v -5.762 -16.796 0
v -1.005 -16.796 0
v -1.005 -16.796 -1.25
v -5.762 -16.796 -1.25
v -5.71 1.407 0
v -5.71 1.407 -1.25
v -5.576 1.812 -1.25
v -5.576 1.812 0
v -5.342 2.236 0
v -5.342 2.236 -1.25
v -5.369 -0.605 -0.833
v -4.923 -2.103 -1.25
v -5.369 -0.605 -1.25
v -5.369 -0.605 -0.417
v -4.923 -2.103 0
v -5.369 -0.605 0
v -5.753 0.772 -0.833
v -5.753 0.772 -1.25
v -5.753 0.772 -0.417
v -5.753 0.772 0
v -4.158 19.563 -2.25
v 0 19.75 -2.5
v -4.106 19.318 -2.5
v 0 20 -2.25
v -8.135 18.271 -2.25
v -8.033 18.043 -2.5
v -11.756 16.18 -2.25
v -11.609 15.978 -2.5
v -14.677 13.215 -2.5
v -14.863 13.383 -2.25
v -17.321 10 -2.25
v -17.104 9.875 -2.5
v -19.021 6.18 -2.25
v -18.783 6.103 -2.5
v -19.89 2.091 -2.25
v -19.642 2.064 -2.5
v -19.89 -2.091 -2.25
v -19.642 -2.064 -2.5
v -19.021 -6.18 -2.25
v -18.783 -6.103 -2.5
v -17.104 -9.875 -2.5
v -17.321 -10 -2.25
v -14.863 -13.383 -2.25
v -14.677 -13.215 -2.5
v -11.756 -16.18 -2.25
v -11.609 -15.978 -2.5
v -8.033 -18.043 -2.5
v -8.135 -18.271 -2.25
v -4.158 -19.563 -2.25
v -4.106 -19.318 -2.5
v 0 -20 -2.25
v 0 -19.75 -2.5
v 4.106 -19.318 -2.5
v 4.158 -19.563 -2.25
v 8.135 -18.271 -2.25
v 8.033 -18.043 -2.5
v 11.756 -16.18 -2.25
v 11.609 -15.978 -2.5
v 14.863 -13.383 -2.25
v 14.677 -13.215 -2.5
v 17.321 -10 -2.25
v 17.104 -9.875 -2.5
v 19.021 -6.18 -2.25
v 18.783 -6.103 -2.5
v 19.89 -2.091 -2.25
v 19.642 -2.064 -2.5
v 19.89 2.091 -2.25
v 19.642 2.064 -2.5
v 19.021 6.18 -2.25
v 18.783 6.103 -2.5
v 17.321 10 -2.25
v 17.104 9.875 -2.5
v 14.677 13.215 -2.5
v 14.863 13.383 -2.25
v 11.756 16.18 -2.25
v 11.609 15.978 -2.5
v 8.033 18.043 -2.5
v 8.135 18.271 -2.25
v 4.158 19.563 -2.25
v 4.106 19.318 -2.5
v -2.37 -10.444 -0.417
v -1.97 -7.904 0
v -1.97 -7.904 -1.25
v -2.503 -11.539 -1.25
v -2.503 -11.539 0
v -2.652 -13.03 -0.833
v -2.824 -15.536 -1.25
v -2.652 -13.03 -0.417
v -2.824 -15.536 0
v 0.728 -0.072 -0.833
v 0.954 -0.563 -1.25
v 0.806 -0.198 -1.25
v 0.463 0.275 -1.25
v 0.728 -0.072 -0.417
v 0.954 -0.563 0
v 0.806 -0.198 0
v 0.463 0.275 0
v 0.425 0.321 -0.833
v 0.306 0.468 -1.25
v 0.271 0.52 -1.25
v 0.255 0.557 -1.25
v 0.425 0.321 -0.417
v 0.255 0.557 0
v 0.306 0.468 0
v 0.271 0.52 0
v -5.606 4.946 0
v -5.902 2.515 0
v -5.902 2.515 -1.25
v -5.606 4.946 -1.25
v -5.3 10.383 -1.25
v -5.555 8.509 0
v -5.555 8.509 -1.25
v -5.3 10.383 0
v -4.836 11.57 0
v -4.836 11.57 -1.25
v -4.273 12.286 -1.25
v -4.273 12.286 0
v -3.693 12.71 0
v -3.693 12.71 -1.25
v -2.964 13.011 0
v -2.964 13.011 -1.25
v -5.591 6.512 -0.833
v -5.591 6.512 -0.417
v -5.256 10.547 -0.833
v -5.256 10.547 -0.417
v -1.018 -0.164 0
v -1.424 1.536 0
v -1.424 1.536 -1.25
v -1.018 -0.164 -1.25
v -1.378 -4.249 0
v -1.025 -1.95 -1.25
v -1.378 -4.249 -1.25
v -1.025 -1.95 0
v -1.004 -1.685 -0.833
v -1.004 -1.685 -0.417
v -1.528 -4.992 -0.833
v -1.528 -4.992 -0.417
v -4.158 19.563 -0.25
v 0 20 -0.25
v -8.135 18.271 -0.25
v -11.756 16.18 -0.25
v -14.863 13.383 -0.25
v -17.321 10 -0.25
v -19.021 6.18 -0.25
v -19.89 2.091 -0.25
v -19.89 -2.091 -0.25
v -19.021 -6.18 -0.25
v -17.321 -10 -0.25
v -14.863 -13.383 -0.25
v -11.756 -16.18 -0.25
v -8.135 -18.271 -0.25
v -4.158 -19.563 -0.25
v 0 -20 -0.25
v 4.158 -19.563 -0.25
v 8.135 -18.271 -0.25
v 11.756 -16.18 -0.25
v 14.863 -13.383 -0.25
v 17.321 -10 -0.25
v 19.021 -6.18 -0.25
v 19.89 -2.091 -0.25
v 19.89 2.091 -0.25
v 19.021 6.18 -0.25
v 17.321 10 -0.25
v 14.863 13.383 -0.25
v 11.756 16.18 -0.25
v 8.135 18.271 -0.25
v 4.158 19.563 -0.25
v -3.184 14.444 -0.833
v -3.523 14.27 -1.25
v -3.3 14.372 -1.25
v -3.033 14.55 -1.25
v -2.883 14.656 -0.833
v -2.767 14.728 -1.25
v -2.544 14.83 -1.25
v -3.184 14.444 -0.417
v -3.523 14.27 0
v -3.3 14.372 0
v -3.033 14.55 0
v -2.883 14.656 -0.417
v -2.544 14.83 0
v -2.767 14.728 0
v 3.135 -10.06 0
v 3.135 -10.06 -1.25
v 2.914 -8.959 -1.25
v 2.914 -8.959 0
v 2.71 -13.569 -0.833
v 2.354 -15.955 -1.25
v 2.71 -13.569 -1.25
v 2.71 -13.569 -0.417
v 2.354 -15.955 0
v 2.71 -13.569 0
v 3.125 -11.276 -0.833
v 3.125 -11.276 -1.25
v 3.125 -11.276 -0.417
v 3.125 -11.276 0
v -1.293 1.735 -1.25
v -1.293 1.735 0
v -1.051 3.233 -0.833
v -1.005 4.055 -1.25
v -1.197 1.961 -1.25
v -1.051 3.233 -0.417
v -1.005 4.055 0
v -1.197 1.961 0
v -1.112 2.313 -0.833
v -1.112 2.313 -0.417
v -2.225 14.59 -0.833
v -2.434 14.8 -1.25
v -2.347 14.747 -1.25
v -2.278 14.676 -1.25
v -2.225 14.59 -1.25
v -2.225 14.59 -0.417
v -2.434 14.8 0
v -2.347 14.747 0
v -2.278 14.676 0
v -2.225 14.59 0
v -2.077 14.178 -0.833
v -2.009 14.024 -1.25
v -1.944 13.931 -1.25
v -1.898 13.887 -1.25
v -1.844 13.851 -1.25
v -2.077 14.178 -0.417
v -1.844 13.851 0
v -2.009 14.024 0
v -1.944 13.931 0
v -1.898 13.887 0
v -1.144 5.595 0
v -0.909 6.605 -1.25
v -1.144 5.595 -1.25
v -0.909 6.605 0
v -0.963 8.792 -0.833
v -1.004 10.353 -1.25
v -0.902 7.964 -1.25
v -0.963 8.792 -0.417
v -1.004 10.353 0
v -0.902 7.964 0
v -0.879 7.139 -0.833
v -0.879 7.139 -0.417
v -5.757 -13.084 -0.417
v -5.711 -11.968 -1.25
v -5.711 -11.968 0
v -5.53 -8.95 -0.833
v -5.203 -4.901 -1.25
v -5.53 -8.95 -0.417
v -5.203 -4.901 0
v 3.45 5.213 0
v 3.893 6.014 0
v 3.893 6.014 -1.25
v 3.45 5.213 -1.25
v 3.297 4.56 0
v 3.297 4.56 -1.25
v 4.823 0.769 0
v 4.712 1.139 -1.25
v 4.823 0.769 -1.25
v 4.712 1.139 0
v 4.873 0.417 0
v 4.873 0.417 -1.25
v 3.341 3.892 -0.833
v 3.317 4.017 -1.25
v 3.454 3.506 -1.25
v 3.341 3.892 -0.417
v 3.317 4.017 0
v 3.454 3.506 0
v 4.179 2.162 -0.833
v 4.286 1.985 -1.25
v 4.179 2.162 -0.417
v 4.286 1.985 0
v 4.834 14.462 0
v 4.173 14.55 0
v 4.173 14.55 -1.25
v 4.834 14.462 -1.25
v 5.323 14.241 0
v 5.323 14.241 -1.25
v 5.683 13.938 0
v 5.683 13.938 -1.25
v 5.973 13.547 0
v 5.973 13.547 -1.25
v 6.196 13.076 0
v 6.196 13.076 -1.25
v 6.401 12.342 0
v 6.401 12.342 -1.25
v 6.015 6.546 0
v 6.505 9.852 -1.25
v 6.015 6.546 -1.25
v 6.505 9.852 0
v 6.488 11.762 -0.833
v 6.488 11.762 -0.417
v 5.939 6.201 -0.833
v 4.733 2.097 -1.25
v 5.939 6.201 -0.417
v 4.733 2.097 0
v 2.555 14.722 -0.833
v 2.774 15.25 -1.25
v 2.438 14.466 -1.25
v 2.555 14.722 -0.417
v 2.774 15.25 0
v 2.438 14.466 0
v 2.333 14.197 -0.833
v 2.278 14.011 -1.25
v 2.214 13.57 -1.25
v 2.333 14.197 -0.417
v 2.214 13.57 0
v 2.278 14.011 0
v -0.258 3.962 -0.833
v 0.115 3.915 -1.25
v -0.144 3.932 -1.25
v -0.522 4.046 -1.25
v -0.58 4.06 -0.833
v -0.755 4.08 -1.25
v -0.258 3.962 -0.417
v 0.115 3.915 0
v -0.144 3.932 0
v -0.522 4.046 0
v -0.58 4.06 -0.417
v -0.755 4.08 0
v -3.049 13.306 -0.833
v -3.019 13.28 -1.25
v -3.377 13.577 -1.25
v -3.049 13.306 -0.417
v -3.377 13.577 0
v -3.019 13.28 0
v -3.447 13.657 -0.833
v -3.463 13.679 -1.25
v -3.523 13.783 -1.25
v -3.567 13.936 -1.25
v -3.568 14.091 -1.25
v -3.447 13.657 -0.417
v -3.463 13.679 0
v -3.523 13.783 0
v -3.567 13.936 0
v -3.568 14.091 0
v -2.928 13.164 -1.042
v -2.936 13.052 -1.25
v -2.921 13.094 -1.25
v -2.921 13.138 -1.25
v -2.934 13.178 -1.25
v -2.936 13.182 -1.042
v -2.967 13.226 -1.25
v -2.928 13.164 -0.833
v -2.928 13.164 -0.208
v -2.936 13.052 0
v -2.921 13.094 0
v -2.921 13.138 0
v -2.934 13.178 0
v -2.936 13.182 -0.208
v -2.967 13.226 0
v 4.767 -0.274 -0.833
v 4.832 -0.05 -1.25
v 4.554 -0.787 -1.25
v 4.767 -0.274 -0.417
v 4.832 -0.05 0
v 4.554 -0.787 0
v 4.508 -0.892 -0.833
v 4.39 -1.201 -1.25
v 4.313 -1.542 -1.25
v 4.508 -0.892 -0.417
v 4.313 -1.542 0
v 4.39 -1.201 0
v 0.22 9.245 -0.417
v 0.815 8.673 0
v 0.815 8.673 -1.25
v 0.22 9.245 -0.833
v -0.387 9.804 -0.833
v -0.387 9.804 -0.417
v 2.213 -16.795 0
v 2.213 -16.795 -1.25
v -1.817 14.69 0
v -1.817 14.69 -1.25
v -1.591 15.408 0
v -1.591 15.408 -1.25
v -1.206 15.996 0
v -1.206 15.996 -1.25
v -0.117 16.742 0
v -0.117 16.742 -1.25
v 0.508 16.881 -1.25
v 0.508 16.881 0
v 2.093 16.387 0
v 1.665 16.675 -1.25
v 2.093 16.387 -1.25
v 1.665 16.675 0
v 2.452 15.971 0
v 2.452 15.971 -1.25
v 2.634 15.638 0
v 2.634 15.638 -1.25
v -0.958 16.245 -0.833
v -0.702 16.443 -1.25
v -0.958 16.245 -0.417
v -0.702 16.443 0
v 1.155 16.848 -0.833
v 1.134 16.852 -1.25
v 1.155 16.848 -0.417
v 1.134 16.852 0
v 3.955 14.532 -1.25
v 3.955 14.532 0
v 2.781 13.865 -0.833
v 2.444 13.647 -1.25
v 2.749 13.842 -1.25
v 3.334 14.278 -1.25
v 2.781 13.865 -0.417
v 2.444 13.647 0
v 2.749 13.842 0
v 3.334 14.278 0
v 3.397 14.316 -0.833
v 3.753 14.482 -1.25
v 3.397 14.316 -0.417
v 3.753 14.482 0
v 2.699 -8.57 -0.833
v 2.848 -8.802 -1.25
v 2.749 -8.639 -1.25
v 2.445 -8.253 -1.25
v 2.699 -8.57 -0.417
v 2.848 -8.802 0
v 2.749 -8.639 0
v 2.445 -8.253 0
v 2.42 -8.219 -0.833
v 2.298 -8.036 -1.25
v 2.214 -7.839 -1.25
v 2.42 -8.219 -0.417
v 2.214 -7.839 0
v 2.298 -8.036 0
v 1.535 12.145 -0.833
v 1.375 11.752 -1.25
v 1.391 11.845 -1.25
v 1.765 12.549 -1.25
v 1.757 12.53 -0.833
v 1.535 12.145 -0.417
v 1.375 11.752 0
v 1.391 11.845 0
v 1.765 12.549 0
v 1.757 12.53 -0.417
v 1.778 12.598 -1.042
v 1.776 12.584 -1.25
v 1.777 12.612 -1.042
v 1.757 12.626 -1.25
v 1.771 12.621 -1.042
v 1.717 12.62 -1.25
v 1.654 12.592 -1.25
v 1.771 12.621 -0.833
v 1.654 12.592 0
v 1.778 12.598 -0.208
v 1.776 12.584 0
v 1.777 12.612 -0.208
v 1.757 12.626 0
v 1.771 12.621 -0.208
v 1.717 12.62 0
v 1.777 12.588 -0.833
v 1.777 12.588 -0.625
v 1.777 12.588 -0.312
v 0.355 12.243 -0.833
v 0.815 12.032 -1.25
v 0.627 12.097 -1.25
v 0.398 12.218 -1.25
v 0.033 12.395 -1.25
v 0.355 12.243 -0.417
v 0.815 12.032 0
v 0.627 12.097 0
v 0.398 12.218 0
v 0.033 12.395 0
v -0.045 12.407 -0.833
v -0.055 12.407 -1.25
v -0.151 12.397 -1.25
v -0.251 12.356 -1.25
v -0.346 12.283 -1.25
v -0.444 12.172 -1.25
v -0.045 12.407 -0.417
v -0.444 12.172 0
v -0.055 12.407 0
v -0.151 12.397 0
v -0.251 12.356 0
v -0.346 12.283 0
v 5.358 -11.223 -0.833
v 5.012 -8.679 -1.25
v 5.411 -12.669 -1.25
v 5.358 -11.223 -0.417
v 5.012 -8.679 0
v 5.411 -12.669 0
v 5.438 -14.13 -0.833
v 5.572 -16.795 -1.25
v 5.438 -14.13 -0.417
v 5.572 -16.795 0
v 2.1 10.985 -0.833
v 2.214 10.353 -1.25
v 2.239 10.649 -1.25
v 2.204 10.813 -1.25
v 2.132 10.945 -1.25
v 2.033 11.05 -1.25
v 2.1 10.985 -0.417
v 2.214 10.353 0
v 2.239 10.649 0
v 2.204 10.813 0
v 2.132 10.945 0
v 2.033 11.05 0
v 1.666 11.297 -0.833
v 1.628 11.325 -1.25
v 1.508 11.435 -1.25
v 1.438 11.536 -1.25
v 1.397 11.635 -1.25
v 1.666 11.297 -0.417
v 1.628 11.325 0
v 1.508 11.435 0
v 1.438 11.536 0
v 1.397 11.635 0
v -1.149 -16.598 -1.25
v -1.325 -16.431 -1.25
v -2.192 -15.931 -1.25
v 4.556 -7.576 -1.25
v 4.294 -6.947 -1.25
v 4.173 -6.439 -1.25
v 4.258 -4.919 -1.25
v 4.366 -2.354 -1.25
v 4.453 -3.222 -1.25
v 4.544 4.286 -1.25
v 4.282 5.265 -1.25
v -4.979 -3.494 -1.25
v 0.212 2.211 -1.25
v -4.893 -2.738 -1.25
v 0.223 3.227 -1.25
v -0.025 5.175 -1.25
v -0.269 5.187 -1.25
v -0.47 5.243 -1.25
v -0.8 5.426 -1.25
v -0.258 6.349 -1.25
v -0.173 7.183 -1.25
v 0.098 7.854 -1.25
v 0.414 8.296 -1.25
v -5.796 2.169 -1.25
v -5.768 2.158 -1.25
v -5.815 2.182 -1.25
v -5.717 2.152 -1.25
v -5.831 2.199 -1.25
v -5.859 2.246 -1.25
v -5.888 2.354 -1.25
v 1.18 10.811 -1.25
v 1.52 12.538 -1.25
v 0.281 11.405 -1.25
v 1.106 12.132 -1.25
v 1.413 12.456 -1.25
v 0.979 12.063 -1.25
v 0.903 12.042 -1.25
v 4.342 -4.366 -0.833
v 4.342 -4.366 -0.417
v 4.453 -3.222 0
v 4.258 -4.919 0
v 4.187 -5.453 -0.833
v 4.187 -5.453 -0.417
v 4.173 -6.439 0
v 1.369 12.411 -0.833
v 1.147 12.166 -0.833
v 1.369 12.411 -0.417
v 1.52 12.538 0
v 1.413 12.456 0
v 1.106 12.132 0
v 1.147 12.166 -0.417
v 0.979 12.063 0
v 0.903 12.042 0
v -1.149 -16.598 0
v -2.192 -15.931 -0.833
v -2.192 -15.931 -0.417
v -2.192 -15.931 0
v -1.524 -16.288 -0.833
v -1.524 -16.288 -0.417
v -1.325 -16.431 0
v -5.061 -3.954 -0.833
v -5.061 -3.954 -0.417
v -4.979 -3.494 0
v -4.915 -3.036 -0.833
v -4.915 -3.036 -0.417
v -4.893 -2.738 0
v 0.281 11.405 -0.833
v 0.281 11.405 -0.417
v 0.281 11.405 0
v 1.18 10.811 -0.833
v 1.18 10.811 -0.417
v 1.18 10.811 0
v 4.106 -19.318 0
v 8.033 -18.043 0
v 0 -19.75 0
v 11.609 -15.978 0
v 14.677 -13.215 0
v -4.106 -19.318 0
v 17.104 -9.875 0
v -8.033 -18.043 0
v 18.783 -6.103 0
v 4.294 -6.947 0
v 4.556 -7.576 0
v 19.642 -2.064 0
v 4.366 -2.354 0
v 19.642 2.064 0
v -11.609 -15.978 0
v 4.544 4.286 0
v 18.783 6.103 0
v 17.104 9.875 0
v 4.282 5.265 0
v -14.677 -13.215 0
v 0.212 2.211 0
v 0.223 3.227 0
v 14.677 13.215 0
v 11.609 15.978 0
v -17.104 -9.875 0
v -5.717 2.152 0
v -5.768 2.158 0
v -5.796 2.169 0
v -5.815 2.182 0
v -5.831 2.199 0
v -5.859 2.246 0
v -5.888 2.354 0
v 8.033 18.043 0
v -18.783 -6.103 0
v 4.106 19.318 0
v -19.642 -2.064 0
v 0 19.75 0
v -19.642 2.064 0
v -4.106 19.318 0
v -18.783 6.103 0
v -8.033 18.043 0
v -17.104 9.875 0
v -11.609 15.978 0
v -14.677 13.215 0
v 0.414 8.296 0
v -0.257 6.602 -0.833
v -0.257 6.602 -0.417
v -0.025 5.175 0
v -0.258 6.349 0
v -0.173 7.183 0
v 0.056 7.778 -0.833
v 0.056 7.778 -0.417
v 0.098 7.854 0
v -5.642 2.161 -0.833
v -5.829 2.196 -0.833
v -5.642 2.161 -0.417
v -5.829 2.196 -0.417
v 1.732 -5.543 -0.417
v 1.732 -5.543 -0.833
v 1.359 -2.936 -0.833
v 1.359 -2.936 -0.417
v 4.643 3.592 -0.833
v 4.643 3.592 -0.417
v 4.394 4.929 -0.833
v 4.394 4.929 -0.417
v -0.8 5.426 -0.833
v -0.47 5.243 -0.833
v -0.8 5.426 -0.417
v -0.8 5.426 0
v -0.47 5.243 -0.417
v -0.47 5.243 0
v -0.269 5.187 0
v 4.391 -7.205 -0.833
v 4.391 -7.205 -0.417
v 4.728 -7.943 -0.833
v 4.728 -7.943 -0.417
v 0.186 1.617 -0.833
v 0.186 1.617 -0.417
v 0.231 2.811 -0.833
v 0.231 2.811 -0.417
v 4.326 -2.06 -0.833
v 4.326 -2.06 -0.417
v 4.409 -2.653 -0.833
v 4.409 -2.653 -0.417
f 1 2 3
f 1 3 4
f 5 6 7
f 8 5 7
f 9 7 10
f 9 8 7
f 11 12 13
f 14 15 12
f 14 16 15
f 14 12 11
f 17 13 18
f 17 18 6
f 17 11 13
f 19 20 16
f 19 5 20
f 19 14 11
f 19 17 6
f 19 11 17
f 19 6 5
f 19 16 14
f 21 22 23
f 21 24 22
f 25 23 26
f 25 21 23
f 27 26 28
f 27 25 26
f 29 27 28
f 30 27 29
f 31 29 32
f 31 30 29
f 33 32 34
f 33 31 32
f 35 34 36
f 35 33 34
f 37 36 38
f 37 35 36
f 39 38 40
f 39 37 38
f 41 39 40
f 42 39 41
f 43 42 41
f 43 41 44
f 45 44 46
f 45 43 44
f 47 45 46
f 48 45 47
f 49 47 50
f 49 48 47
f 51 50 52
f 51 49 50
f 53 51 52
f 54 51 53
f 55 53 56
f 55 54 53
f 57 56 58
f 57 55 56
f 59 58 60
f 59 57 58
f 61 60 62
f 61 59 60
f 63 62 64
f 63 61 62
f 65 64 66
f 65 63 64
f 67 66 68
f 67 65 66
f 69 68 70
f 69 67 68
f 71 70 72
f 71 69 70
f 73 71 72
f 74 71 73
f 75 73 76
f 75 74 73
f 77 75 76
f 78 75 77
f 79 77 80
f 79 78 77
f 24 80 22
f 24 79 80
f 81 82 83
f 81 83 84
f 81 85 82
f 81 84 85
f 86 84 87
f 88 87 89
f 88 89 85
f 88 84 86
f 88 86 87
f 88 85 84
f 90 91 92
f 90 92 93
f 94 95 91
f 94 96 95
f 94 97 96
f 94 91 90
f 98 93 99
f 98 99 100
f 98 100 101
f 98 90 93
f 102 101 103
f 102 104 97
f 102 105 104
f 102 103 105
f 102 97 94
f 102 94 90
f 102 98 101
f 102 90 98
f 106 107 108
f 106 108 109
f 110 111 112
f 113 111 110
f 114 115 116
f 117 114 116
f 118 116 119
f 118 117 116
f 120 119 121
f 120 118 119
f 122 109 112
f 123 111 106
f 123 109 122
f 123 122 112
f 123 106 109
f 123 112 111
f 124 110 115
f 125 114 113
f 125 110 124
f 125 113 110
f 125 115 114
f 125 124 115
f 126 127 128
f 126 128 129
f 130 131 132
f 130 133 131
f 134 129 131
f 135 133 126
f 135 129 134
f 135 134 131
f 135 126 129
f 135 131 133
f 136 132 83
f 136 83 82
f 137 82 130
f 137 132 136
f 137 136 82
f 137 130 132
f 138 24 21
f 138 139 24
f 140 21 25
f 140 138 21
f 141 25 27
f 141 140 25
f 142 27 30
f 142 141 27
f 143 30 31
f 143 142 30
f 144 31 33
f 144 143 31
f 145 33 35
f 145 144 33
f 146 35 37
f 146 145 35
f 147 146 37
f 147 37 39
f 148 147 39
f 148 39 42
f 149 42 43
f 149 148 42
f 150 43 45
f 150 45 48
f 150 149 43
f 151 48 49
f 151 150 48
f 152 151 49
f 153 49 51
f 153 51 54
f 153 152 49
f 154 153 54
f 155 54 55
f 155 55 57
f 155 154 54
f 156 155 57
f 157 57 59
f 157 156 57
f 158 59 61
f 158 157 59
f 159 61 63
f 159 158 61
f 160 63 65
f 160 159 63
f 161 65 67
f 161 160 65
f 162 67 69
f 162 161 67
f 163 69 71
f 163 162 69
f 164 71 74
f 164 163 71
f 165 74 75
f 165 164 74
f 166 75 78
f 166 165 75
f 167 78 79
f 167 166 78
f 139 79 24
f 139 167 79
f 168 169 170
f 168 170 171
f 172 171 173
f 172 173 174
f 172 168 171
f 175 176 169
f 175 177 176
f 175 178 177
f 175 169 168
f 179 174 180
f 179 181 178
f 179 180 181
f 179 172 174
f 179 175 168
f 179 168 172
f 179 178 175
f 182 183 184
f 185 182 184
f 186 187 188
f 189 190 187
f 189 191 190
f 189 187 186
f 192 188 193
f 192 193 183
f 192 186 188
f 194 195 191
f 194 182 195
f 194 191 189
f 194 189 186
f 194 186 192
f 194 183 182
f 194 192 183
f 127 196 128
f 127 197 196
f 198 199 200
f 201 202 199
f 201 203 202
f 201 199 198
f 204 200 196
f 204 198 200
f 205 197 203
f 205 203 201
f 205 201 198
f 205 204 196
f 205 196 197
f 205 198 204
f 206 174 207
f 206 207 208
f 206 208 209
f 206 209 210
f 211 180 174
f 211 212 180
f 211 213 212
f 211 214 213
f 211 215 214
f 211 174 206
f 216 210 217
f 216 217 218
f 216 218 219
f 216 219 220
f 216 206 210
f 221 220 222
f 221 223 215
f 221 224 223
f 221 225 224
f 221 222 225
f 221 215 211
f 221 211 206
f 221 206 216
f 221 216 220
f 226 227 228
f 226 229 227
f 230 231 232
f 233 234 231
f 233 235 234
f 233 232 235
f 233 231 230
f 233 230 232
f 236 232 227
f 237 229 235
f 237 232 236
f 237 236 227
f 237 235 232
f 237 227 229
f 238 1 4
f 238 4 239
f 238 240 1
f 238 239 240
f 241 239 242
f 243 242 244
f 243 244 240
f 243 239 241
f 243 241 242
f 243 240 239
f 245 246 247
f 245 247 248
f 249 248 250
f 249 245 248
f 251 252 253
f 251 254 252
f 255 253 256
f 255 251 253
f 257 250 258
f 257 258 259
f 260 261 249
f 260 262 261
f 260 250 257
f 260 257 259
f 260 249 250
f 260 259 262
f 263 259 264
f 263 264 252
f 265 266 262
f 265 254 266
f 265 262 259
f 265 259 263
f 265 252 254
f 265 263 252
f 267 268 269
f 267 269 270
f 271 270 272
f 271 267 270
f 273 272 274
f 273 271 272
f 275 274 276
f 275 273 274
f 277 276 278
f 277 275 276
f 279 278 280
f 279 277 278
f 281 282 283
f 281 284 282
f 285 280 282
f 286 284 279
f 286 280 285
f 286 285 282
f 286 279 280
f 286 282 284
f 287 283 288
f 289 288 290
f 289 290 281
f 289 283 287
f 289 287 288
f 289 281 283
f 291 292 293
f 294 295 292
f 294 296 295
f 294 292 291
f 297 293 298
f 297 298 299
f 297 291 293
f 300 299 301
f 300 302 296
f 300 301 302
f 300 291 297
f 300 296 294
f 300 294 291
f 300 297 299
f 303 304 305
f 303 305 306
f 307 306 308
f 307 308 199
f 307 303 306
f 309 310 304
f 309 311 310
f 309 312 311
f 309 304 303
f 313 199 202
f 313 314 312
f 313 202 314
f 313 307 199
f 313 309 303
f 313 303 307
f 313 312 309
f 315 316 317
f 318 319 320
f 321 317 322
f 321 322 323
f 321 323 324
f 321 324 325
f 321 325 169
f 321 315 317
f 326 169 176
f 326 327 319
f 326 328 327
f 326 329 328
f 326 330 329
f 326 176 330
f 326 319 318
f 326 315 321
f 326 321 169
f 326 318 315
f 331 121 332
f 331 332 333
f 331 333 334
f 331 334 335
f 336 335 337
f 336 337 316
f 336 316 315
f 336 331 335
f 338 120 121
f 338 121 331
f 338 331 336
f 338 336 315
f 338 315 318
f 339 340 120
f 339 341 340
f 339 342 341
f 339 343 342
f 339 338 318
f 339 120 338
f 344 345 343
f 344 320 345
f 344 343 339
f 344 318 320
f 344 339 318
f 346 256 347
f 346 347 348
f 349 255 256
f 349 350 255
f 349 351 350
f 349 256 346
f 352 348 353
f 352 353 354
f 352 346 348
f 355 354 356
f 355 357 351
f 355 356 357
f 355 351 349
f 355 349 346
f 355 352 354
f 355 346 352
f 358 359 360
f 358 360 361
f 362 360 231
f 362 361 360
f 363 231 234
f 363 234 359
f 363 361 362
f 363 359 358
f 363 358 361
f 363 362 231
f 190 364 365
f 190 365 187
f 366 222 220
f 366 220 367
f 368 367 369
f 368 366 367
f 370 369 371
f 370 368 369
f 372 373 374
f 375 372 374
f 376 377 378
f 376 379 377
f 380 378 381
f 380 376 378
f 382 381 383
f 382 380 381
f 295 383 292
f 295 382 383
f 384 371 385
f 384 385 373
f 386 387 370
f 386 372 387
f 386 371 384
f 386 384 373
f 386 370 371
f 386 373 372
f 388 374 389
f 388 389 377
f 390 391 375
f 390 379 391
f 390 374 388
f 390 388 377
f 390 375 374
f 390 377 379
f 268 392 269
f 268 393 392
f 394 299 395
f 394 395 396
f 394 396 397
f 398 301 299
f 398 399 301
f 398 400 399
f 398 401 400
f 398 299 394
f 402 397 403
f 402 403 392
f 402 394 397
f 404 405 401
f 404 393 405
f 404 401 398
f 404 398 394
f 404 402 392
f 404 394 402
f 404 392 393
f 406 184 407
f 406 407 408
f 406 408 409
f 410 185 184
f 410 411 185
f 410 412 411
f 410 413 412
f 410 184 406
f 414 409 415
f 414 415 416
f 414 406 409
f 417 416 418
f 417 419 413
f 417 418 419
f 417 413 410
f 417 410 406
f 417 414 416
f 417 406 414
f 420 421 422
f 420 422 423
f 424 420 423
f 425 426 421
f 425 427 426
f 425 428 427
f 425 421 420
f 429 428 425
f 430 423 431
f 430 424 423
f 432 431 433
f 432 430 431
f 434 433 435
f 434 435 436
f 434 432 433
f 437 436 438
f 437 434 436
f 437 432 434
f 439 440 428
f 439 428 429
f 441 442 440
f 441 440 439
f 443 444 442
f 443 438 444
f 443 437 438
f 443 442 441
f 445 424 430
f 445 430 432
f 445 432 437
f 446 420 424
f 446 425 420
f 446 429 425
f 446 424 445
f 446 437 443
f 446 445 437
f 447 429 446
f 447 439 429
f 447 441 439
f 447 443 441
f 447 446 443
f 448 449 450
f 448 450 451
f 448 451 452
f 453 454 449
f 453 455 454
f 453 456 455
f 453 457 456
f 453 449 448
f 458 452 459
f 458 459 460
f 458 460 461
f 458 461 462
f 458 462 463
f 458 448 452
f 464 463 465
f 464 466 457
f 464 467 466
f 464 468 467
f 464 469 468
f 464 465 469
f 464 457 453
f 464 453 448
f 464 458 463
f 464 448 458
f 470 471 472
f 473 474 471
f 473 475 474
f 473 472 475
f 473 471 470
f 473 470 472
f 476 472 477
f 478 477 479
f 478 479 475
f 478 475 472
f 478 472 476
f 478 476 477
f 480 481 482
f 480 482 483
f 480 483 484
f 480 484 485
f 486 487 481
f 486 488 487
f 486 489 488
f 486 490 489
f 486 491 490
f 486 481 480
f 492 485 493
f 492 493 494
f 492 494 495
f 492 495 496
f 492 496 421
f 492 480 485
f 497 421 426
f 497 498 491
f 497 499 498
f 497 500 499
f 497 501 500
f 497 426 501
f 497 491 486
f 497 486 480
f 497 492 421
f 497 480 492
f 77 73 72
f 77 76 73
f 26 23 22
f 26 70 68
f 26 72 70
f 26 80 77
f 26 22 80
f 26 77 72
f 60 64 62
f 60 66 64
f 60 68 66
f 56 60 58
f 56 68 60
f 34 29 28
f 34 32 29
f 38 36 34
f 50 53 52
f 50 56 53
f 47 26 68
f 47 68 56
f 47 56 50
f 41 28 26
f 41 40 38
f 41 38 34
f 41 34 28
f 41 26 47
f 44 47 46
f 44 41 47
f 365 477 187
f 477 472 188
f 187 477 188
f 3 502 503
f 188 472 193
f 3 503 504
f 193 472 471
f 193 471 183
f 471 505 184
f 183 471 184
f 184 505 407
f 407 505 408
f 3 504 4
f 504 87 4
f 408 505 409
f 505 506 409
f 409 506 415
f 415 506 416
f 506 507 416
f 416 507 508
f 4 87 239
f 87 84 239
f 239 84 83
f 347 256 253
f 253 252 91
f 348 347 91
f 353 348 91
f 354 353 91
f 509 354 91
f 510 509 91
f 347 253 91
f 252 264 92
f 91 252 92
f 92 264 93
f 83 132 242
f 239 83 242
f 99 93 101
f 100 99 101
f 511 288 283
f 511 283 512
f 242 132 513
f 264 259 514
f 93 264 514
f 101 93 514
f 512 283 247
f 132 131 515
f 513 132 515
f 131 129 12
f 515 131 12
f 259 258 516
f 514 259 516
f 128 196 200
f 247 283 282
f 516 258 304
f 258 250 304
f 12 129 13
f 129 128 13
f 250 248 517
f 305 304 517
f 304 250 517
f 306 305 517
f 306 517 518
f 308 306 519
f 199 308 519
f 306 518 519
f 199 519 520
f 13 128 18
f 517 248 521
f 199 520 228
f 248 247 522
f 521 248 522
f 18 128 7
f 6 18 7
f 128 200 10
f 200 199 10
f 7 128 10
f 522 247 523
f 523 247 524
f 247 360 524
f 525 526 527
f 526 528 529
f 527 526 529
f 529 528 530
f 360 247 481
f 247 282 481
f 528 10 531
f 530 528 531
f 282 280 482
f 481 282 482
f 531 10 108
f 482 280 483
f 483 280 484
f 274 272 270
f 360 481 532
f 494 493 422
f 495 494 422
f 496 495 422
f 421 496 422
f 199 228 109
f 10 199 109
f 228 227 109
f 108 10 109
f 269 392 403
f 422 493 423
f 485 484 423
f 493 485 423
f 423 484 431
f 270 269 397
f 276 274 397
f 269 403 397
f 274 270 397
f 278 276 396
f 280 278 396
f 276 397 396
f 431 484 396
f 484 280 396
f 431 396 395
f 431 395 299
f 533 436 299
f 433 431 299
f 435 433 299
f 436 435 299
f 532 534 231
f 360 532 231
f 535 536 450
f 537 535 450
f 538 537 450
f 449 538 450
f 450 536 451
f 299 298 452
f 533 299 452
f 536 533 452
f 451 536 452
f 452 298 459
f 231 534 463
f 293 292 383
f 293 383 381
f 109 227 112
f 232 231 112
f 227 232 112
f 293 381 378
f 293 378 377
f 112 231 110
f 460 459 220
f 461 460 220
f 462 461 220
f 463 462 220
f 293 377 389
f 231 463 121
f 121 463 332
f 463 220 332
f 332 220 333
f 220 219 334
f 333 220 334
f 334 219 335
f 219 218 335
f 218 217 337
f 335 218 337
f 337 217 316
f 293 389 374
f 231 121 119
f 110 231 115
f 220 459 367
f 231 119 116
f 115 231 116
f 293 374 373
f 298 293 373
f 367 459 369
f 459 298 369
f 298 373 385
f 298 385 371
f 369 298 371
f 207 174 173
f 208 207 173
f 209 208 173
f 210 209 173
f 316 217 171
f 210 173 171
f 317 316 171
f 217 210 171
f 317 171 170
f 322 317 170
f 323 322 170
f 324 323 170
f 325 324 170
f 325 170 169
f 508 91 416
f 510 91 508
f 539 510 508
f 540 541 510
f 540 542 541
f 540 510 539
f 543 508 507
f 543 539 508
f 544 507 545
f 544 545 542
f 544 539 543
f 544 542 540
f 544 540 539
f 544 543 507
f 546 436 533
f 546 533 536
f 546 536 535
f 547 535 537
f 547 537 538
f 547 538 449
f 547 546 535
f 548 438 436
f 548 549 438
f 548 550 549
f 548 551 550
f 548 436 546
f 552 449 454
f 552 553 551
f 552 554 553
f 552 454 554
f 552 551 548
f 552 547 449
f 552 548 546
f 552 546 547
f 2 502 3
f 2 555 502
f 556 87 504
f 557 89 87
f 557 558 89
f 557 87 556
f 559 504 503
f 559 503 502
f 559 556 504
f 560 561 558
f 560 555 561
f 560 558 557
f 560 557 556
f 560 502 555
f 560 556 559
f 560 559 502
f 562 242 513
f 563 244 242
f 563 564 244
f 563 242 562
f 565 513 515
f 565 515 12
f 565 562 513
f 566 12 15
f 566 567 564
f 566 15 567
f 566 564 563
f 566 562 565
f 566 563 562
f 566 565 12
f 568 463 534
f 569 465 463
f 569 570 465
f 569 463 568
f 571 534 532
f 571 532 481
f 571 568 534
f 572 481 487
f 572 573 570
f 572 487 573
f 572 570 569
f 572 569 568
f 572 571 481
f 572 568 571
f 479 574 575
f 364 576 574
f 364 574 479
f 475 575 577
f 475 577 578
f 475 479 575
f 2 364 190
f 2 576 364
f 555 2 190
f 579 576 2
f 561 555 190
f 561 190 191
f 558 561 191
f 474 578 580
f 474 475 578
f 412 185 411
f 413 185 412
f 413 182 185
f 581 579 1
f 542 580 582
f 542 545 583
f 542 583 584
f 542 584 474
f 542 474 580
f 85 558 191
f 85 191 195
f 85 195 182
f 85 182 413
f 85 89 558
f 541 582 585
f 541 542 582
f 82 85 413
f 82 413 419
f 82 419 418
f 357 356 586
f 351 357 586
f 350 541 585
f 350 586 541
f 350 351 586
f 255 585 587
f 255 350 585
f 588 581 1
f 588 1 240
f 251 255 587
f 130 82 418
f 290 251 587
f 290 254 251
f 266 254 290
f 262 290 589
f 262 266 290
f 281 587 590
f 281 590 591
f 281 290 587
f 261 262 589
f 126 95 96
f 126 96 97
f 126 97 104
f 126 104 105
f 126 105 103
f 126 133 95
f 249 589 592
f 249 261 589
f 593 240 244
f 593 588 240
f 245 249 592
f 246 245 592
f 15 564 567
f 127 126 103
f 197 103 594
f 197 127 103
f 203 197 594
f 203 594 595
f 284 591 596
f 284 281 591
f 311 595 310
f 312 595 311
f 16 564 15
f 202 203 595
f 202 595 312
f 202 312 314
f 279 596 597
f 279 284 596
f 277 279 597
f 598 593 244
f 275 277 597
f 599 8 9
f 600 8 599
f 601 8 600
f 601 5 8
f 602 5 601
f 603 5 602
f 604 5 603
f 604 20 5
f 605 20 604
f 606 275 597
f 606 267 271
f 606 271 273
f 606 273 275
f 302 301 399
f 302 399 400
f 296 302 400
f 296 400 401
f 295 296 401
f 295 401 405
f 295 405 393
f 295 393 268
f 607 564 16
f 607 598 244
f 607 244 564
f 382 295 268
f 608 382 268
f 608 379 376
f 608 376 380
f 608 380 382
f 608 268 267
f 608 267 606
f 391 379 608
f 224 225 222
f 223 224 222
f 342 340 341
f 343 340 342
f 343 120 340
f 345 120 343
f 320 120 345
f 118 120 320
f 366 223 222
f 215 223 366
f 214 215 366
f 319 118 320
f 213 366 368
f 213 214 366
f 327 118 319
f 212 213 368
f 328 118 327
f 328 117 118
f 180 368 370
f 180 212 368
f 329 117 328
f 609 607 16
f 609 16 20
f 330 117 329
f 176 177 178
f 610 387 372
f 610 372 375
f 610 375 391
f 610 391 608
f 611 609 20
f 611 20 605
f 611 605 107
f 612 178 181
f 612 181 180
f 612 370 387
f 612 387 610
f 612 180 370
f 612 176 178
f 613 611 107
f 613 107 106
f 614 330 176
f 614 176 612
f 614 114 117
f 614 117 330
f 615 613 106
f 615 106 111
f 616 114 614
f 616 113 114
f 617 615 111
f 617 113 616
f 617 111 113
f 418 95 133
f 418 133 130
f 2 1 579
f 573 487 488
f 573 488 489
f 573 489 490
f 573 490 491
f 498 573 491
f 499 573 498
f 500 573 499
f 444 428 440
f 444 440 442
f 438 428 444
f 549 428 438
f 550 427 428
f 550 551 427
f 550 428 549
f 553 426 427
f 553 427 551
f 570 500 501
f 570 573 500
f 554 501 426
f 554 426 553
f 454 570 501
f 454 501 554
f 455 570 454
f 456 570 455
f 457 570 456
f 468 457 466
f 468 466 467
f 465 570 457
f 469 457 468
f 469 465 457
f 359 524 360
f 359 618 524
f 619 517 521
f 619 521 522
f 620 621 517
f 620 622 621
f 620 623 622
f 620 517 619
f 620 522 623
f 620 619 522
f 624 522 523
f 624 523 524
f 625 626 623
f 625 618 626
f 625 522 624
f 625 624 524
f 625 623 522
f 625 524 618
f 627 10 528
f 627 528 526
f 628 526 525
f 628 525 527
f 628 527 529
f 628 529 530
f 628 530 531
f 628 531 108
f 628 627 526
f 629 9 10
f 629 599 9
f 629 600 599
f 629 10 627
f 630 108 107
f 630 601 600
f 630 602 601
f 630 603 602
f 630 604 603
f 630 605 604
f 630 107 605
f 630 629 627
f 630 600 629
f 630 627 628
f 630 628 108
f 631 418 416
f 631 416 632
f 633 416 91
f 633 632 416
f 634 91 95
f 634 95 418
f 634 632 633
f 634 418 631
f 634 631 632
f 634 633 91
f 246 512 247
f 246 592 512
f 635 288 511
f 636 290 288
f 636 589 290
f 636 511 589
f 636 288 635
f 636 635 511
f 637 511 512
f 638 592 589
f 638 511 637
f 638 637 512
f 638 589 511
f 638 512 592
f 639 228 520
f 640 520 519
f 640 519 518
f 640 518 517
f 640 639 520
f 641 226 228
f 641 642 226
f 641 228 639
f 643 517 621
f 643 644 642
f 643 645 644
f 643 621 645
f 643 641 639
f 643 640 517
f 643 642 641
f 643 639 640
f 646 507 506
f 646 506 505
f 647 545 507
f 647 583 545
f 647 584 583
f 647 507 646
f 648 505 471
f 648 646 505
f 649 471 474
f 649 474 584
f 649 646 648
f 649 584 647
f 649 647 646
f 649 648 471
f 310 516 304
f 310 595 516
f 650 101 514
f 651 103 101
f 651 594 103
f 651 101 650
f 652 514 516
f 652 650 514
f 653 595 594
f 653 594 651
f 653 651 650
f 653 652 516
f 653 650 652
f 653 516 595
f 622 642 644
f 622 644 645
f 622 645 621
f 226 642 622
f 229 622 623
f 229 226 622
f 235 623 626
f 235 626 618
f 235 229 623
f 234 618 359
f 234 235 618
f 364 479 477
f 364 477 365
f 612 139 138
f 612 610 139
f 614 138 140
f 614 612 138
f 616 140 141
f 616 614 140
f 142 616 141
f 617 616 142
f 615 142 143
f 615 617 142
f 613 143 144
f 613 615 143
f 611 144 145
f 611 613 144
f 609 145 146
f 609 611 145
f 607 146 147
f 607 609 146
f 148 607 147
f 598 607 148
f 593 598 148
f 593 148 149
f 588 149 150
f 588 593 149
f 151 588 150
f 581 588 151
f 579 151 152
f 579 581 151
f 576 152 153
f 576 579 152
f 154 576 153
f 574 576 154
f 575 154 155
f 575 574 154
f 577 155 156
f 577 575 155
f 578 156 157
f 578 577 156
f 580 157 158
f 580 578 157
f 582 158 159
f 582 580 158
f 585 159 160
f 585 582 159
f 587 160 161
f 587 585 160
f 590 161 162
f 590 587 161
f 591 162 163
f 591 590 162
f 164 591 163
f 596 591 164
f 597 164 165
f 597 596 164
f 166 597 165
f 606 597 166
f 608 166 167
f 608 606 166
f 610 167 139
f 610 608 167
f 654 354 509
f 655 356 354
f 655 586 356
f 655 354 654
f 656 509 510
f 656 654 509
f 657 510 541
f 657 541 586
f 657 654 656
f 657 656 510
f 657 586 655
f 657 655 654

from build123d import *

# Parameters (mm, degrees)
POCKET_DEPTH = 1.25


with BuildPart() as part:
    # Sketch (on DatumPlane) → Revolution (revolve)
    with BuildSketch(Plane.YZ):
        Polygon((0, 0), (0, -2.5), (19.75, -2.5), (20, -2.25), (20, -0.25), (19.75, 0), align=None)
    revolve(axis=Axis((0, 0, 0), (0, 0, 1)))

    # Sketch005 (on DatumPlane) → Pocket (cut)
    with BuildSketch(Plane.XY):
        with BuildLine():
            add(Edge.make_bspline(
                [(2.212734, -16.79531), (2.353913, -15.955428)],
                knots=[0, 0, 11.60658, 11.60658], degree=1))
            add(Edge.make_bspline(
                [(2.353913, -15.955428), (2.452386, -13.484431), (3.666422, -11.326317), (2.913712, -8.958563)],
                knots=[0, 0, 0, 0, 1, 1, 1, 1], degree=3))
            add(Edge.make_bspline(
                [(2.913712, -8.958563), (2.776863, -8.528936), (2.33689, -8.25553), (2.213762, -7.839185)],
                knots=[0, 0, 0, 0, 1, 1, 1, 1], degree=3))
            add(Edge.make_bspline(
                [(2.213762, -7.839185), (1.63261, -5.878384), (1.420254, -2.638828), (0.954306, -0.562751)],
                knots=[0, 0, 0, 0, 1, 1, 1, 1], degree=3))
            add(Edge.make_bspline(
                [(0.954306, -0.562751), (0.837488, -0.042136), (0.287742, 0.418016), (0.254795, 0.556627)],
                knots=[0, 0, 0, 0, 1, 1, 1, 1], degree=3))
            add(Edge.make_bspline(
                [(0.254795, 0.556627), (0.035836, 1.475243), (0.405146, 2.931279), (0.114644, 3.915201)],
                knots=[0, 0, 0, 0, 1, 1, 1, 1], degree=3))
            add(Edge.make_bspline(
                [(0.114644, 3.915201), (-0.335749, 3.884236), (-0.477001, 4.162705), (-1.004588, 4.055279)],
                knots=[0, 0, 0, 0, 1, 1, 1, 1], degree=3))
            add(Edge.make_bspline(
                [(-1.004588, 4.055279), (-1.121992, 3.360832), (-0.906555, 2.162059), (-1.424455, 1.536367)],
                knots=[0, 0, 0, 0, 1, 1, 1, 1], degree=3))
            add(Edge.make_bspline(
                [(-1.424455, 1.536367), (-0.190168, -1.482321), (-1.911464, -5.34911), (-1.969652, -7.903684)],
                knots=[0, 0, 0, 0, 1, 1, 1, 1], degree=3))
            add(Edge.make_bspline(
                [(-1.969652, -7.903684), (-2.432446, -10.377469), (-2.703357, -13.113506), (-2.823623, -15.53644)],
                knots=[0, 0, 0, 0, 1, 1, 1, 1], degree=3))
            add(Edge.make_bspline(
                [(-2.823623, -15.53644), (-2.274023, -16.012809), (-1.385932, -16.150099), (-1.004588, -16.795897)],
                knots=[0, 0, 0, 0, 1, 1, 1, 1], degree=3))
            add(Edge.make_bspline(
                [(-1.004588, -16.795897), (-5.762036, -16.795897)],
                knots=[0, 0, 64.835, 64.835], degree=1))
            add(Edge.make_bspline(
                [(-5.762036, -16.795897), (-5.908571, -13.463225), (-5.538601, -8.73975), (-5.202677, -4.901359)],
                knots=[0, 0, 0, 0, 1, 1, 1, 1], degree=3))
            add(Edge.make_bspline(
                [(-5.202677, -4.901359), (-5.116898, -3.924994), (-4.784204, -3.058916), (-4.922814, -2.102804)],
                knots=[0, 0, 0, 0, 1, 1, 1, 1], degree=3))
            add(Edge.make_bspline(
                [(-4.922814, -2.102804), (-5.15799, -0.475138), (-6.392498, 0.658255), (-5.342242, 2.235731)],
                knots=[0, 0, 0, 0, 1, 1, 1, 1], degree=3))
            add(Edge.make_bspline(
                [(-5.342242, 2.235731), (-5.698637, 2.163087), (-5.885237, 1.997106), (-5.902261, 2.515373)],
                knots=[0, 0, 0, 0, 1, 1, 1, 1], degree=3))
            add(Edge.make_bspline(
                [(-5.902261, 2.515373), (-4.959136, 5.955324), (-6.879579, 11.869573), (-2.963554, 13.011331)],
                knots=[0, 0, 0, 0, 1, 1, 1, 1], degree=3))
            add(Edge.make_bspline(
                [(-2.963554, 13.011331), (-2.683178, 13.346374), (-3.817451, 13.457541), (-3.523427, 14.270347)],
                knots=[0, 0, 0, 0, 1, 1, 1, 1], degree=3))
            add(Edge.make_bspline(
                [(-3.523427, 14.270347), (-3.140321, 14.400739), (-2.926572, 14.699607), (-2.543613, 14.830292)],
                knots=[0, 0, 0, 0, 1, 1, 1, 1], degree=3))
            add(Edge.make_bspline(
                [(-2.543613, 14.830292), (-2.053816, 14.76051), (-2.204608, 14.0497), (-1.844029, 13.850773)],
                knots=[0, 0, 0, 0, 1, 1, 1, 1], degree=3))
            add(Edge.make_bspline(
                [(-1.844029, 13.850773), (-2.144071, 17.003889), (1.974624, 18.085918), (2.773854, 15.250087)],
                knots=[0, 0, 0, 0, 1, 1, 1, 1], degree=3))
            add(Edge.make_bspline(
                [(2.773854, 15.250087), (2.592685, 14.684491), (2.246708, 14.284215), (2.213762, 13.570469)],
                knots=[0, 0, 0, 0, 1, 1, 1, 1], degree=3))
            add(Edge.make_bspline(
                [(2.213762, 13.570469), (2.792786, 13.662925), (3.280014, 14.548962), (4.172728, 14.550283)],
                knots=[0, 0, 0, 0, 1, 1, 1, 1], degree=3))
            add(Edge.make_bspline(
                [(4.172728, 14.550283), (8.655083, 14.556593), (5.532639, 4.064598), (4.732674, 2.096606)],
                knots=[0, 0, 0, 0, 1, 1, 1, 1], degree=3))
            add(Edge.make_bspline(
                [(4.732674, 2.096606), (4.690702, 3.640108), (4.551504, 5.086751), (3.893159, 6.014246)],
                knots=[0, 0, 0, 0, 1, 1, 1, 1], degree=3))
            add(Edge.make_bspline(
                [(3.893159, 6.014246), (2.13422, 3.558659), (4.761805, 2.306173), (4.872605, 0.416989)],
                knots=[0, 0, 0, 0, 1, 1, 1, 1], degree=3))
            add(Edge.make_bspline(
                [(4.872605, 0.416989), (4.917146, -0.345406), (4.402694, -0.841587), (4.312953, -1.541977)],
                knots=[0, 0, 0, 0, 1, 1, 1, 1], degree=3))
            add(Edge.make_bspline(
                [(4.312953, -1.541977), (4.255498, -1.990169), (4.464992, -2.698558), (4.452811, -3.221668)],
                knots=[0, 0, 0, 0, 1, 1, 1, 1], degree=3))
            add(Edge.make_bspline(
                [(4.452811, -3.221668), (4.426028, -4.37979), (4.053783, -5.518319), (4.172802, -6.43943)],
                knots=[0, 0, 0, 0, 1, 1, 1, 1], degree=3))
            add(Edge.make_bspline(
                [(4.172802, -6.43943), (4.27487, -7.226994), (4.812289, -7.936631), (5.012317, -8.678994)],
                knots=[0, 0, 0, 0, 1, 1, 1, 1], degree=3))
            add(Edge.make_bspline(
                [(5.012317, -8.678994), (5.596477, -10.840703), (5.304801, -14.451403), (5.572409, -16.79531)],
                knots=[0, 0, 0, 0, 1, 1, 1, 1], degree=3))
            add(Edge.make_bspline(
                [(5.572409, -16.79531), (3.386852, -16.79531)],
                knots=[0, 0, 29.785, 29.785], degree=1))
            add(Edge.make_bspline(
                [(3.386852, -16.79531), (2.213542, -16.79531)],
                knots=[0, 0, 15.99, 15.99], degree=1))
            add(Edge.make_bspline(
                [(2.213542, -16.79531), (2.212734, -16.79531)],
                knots=[0, 0, 0.011, 0.011], degree=1))
        make_face()
        with BuildLine():
            add(Edge.make_bspline(
                [(0.814888, 12.031884), (0.306967, 12.149582), (-0.027122, 12.722883), (-0.444202, 12.172109)],
                knots=[0, 0, 0, 0, 1, 1, 1, 1], degree=3))
            add(Edge.make_bspline(
                [(-0.444202, 12.172109), (0.181271, 11.305297), (1.124615, 10.755404), (2.214129, 10.353001)],
                knots=[0, 0, 0, 0, 1, 1, 1, 1], degree=3))
            add(Edge.make_bspline(
                [(2.214129, 10.353001), (2.41379, 11.298327), (1.4408, 11.072396), (1.374613, 11.751948)],
                knots=[0, 0, 0, 0, 1, 1, 1, 1], degree=3))
            add(Edge.make_bspline(
                [(1.374613, 11.751948), (1.375934, 12.042671), (2.048515, 12.797141), (1.654256, 12.591903)],
                knots=[0, 0, 0, 0, 1, 1, 1, 1], degree=3))
            add(Edge.make_bspline(
                [(1.654256, 12.591903), (1.277828, 12.501942), (1.261465, 12.051476), (0.814888, 12.031884)],
                knots=[0, 0, 0, 0, 1, 1, 1, 1], degree=3))
        make_face(mode=Mode.SUBTRACT)
        with BuildLine():
            add(Edge.make_bspline(
                [(-1.144446, 5.595112), (-0.750334, 5.4758), (-0.569898, 5.143032), (-0.024554, 5.175244)],
                knots=[0, 0, 0, 0, 1, 1, 1, 1], degree=3))
            add(Edge.make_bspline(
                [(-0.024554, 5.175244), (-0.563587, 6.717205), (-0.133447, 7.929039), (0.814888, 8.67331)],
                knots=[0, 0, 0, 0, 1, 1, 1, 1], degree=3))
            add(Edge.make_bspline(
                [(0.814888, 8.67331), (0.225444, 9.250353), (-0.380877, 9.810005), (-1.004294, 10.352927)],
                knots=[0, 0, 0, 0, 1, 1, 1, 1], degree=3))
            add(Edge.make_bspline(
                [(-1.004294, 10.352927), (-1.116636, 8.904083), (-0.572319, 7.017394), (-1.144446, 5.595112)],
                knots=[0, 0, 0, 0, 1, 1, 1, 1], degree=3))
        make_face(mode=Mode.SUBTRACT)
    extrude(amount=-POCKET_DEPTH, mode=Mode.SUBTRACT)


solid = part.part
